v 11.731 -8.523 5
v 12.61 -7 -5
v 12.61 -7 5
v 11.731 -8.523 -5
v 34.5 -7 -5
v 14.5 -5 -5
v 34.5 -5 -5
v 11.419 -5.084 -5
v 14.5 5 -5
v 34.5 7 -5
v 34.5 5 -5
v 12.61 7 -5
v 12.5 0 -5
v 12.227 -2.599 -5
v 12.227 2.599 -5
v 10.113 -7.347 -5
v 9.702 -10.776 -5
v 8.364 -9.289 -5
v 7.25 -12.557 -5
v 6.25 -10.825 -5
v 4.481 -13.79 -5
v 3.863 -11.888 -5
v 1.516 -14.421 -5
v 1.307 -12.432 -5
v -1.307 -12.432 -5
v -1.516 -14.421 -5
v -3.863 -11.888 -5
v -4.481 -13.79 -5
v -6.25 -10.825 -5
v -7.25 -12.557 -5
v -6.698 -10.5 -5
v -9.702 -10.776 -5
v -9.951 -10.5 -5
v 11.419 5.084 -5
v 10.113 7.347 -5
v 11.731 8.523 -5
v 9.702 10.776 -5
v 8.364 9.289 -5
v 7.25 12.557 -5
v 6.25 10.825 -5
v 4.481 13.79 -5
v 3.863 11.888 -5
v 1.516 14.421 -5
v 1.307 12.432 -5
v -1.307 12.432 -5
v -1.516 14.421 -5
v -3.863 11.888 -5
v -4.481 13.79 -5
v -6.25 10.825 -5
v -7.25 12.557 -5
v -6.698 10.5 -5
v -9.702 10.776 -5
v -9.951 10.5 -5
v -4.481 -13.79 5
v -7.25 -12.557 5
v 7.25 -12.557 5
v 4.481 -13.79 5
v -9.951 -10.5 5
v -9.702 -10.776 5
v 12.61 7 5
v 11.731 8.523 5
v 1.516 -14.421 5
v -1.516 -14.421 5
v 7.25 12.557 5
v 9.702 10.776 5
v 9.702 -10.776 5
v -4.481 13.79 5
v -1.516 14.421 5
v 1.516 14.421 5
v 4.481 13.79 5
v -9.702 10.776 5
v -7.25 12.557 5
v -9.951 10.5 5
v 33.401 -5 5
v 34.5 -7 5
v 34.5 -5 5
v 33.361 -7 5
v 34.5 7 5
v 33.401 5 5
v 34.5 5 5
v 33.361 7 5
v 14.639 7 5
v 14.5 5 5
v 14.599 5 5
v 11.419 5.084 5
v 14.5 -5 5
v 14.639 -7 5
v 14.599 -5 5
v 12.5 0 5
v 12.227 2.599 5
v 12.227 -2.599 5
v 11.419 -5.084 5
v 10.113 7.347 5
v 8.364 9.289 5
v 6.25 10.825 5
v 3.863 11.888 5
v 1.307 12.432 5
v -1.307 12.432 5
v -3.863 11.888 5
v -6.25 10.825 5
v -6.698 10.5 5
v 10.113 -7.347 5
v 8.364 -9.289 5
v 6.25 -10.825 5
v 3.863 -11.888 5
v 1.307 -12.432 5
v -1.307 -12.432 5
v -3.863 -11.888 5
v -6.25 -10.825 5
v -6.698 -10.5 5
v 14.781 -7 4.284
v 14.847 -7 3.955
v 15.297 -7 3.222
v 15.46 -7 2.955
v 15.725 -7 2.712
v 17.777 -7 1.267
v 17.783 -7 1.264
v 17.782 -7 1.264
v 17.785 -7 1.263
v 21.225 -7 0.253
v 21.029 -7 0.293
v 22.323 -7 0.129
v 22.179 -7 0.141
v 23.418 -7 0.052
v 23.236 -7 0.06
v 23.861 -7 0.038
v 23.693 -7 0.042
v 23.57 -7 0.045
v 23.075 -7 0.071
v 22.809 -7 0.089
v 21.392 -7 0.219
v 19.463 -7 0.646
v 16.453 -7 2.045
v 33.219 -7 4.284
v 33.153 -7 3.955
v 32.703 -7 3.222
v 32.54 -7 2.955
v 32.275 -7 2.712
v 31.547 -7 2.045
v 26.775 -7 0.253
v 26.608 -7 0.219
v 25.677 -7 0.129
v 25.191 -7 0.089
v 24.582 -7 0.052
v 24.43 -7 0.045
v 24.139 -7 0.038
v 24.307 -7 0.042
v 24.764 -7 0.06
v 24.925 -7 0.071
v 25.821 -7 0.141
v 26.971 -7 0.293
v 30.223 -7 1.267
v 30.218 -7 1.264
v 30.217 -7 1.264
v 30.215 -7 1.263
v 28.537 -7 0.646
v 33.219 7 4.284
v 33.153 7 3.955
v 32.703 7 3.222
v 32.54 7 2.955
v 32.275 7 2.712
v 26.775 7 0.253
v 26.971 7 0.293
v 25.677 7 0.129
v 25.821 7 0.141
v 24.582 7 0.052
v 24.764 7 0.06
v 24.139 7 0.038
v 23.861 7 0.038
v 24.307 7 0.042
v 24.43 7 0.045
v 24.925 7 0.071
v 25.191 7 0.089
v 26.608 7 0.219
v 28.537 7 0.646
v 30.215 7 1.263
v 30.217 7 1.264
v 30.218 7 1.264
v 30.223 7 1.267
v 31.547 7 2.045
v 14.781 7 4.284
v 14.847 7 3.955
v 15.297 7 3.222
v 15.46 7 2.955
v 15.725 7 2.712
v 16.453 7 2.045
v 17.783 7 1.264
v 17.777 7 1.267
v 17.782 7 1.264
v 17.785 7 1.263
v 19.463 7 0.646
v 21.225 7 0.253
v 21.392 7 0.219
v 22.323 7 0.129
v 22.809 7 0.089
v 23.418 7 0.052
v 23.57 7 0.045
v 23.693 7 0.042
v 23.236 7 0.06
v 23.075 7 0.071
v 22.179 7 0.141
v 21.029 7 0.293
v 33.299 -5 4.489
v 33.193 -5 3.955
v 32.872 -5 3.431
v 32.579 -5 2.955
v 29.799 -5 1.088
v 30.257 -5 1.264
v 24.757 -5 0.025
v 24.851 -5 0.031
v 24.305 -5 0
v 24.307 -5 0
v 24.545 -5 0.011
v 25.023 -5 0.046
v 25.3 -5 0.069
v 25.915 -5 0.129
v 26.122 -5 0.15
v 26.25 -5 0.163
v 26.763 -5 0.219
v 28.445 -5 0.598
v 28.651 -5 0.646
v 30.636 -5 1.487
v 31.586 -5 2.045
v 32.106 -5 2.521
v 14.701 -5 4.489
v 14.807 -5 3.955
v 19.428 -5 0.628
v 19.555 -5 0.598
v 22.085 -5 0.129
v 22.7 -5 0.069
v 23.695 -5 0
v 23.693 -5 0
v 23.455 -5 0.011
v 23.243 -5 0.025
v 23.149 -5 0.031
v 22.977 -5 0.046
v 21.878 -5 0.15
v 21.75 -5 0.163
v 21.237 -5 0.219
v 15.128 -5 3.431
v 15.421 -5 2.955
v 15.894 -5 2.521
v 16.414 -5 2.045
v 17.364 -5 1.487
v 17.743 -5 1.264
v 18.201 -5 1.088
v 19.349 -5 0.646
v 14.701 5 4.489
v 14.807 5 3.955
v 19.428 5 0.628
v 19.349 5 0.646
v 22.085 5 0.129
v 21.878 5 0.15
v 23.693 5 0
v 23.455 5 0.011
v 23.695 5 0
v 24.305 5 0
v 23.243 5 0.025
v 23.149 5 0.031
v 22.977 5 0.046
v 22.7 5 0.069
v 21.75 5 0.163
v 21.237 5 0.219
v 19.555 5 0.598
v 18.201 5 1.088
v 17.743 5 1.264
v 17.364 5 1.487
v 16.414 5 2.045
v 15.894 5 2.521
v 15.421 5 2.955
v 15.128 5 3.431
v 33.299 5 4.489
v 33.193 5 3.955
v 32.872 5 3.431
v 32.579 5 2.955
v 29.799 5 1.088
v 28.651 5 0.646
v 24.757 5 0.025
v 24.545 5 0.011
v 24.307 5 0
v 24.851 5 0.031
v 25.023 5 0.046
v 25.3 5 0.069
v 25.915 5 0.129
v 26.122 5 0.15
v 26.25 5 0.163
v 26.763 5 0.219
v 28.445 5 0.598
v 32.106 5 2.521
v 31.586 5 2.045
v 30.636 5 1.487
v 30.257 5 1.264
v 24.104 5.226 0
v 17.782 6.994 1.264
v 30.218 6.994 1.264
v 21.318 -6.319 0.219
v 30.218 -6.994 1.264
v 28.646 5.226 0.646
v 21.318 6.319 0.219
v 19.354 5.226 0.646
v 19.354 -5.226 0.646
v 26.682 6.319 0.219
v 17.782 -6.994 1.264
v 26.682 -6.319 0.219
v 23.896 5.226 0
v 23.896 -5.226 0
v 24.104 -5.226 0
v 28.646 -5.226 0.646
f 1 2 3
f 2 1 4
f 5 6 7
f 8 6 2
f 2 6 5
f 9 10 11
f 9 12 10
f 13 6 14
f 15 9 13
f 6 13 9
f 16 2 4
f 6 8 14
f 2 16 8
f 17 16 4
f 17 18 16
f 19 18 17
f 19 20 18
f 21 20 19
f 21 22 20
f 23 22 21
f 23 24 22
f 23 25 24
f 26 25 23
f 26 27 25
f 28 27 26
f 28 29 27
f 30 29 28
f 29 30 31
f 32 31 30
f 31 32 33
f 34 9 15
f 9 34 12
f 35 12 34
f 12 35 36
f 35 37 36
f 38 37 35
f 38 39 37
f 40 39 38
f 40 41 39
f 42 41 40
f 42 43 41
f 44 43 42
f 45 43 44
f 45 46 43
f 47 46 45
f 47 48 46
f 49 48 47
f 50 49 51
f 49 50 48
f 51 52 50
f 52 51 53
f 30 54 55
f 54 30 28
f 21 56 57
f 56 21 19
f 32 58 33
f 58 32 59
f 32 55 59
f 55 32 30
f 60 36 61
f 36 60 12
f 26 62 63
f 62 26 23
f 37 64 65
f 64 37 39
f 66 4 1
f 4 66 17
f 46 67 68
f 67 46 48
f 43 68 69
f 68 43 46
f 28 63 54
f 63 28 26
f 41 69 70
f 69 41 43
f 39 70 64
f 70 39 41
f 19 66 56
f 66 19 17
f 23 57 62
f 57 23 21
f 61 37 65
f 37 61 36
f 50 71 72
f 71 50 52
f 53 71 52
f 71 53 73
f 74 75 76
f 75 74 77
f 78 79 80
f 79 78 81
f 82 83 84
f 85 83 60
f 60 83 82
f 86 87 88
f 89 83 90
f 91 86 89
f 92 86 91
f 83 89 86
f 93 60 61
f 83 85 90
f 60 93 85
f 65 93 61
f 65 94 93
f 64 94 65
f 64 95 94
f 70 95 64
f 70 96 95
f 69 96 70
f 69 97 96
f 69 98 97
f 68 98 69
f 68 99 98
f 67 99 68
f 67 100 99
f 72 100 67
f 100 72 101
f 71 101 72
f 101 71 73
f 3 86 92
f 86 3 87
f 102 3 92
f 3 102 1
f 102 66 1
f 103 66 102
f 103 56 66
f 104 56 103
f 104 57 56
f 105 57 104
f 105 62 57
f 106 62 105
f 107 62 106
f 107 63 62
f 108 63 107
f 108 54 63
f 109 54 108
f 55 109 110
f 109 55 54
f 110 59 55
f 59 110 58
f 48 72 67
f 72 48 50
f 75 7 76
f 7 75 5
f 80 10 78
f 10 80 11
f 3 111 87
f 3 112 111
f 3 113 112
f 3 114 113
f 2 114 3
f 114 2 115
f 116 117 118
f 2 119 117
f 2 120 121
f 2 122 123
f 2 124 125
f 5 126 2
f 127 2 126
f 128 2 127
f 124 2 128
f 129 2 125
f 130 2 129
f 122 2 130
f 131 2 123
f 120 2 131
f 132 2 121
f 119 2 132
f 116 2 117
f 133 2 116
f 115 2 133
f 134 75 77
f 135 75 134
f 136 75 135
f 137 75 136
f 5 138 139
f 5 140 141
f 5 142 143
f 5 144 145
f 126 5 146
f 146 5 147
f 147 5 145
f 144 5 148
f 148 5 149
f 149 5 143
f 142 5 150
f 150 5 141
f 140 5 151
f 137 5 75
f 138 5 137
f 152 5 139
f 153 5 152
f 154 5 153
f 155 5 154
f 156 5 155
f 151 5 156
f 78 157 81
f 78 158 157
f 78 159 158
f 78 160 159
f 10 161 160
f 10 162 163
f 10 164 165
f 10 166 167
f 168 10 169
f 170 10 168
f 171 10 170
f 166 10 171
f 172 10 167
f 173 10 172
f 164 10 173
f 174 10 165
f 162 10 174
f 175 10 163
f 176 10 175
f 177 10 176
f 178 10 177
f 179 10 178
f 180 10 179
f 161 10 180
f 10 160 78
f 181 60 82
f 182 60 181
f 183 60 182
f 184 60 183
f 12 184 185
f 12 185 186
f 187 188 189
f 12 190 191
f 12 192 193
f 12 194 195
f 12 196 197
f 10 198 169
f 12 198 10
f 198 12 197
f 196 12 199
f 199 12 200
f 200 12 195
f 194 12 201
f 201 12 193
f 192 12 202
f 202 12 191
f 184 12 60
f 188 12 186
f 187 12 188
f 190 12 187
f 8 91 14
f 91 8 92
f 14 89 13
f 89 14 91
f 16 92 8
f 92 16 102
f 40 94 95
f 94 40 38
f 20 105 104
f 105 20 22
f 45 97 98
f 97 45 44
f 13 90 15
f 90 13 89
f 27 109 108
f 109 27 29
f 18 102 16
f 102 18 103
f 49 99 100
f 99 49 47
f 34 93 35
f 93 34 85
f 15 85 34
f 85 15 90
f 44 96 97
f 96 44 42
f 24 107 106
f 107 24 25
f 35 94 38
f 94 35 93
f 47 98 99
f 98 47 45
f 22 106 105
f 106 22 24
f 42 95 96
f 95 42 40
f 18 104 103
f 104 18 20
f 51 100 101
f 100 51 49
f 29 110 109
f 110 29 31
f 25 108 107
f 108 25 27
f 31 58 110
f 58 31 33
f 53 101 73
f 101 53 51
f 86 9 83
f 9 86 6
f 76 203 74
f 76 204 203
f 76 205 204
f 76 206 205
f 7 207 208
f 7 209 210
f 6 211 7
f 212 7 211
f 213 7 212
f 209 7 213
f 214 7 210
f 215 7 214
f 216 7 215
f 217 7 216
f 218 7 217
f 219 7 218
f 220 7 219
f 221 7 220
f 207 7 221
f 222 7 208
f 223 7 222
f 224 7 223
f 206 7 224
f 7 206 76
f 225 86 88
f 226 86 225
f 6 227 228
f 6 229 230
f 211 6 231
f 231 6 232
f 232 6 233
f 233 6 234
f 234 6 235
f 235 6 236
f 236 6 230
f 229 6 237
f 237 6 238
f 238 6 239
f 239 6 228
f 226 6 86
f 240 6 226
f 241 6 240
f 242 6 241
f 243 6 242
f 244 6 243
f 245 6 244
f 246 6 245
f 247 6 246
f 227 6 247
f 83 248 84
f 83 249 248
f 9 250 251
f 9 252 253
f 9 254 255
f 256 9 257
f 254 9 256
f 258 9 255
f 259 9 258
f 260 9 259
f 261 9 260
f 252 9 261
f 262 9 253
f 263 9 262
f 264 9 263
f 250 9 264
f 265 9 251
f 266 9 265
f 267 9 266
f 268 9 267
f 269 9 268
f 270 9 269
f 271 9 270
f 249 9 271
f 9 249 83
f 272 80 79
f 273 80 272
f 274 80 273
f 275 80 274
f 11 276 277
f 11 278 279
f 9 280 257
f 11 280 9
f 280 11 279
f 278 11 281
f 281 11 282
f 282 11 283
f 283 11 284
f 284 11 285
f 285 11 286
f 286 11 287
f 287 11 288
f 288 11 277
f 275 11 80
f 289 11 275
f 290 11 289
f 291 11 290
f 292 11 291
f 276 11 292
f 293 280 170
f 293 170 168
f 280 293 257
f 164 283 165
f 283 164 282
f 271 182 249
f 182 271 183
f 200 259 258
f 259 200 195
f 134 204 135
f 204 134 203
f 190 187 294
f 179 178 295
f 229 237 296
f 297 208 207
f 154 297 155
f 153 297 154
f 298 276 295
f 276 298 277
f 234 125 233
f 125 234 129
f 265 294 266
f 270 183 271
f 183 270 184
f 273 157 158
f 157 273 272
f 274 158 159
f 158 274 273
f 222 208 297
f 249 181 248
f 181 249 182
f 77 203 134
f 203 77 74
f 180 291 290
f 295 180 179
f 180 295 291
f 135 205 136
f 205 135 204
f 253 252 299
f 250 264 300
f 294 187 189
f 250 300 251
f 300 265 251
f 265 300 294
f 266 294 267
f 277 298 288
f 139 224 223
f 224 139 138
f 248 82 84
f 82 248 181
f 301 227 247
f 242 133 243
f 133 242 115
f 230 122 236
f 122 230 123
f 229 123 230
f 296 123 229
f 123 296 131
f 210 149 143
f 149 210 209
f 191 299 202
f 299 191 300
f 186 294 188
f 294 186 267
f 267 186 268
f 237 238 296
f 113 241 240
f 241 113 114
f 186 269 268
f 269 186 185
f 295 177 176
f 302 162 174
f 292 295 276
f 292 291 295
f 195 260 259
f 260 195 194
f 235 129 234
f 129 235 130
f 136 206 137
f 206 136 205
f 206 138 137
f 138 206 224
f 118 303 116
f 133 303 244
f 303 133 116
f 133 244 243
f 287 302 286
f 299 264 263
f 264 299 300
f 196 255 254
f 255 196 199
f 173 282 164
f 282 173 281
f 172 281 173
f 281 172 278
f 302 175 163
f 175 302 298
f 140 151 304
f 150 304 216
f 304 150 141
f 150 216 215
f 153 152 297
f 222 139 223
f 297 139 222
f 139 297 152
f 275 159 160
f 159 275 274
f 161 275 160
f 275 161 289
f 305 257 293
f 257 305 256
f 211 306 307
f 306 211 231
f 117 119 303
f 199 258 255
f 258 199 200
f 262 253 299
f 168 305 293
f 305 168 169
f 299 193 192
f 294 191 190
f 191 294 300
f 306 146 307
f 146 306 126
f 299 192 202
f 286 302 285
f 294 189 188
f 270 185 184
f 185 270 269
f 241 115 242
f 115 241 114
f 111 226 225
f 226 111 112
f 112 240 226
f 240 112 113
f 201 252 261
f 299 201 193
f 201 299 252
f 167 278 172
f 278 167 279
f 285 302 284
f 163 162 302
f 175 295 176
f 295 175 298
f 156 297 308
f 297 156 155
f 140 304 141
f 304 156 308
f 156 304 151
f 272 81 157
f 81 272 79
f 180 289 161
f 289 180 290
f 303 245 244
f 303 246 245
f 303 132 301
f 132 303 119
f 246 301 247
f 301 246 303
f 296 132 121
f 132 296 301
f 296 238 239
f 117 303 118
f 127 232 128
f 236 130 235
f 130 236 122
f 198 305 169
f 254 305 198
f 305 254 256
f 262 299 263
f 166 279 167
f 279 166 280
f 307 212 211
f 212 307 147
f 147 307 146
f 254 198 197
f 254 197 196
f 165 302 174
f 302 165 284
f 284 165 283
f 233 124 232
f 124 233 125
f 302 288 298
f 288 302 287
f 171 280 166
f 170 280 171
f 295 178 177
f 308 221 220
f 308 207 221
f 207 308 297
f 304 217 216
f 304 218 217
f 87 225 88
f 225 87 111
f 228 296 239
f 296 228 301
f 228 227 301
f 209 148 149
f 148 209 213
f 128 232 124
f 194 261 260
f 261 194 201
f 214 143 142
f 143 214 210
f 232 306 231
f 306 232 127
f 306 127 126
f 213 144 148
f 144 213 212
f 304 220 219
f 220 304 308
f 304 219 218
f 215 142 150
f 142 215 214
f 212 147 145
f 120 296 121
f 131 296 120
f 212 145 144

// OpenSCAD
/* [Rod Clip] */
// Matching the rod diameter
inside_diameter=25;
// Thickness of the whole clip
clip_thickness=2;
// Spring-in of clip ends to snap on the rod
clip_end_distance=2;
//Hight of the whole clip
clip_hight=10;
/* [Razor Holder] */
//Length of the holding arms
holder_length=20;
//Space beween holding arms
holder_space=10;
//Depht of the cavity
holder_depht=0.5; //[0.1:0.1:0.8]

rotate([180,0,0])
difference() {
   	union(){
	cylinder(clip_hight,inside_diameter/2+clip_thickness,inside_diameter/2+clip_thickness, center=true);
	translate([(holder_length+inside_diameter/2+clip_thickness)/2,0,0])
		cube([holder_length+inside_diameter/2+clip_thickness,holder_space+clip_thickness*2,clip_hight],true);	
	}
    union(){
	cylinder(clip_hight+2,inside_diameter/2,inside_diameter/2, center=true);
	translate([(inside_diameter/2+clip_thickness)/-2,0,0])
		cube([inside_diameter/2+clip_thickness,inside_diameter-clip_end_distance*2,clip_hight+2],true);
	translate([holder_length/2+inside_diameter/2+clip_thickness+0.5,0,0])
		cube([holder_length+1,holder_space,clip_hight+2],true);
	translate([holder_length/2+inside_diameter/2+clip_thickness-(clip_thickness/4),0,-clip_hight/2])
		resize(newsize=[holder_length-clip_thickness/2,holder_space*10,clip_hight*holder_depht*2]) sphere(r=10);
	}
}
